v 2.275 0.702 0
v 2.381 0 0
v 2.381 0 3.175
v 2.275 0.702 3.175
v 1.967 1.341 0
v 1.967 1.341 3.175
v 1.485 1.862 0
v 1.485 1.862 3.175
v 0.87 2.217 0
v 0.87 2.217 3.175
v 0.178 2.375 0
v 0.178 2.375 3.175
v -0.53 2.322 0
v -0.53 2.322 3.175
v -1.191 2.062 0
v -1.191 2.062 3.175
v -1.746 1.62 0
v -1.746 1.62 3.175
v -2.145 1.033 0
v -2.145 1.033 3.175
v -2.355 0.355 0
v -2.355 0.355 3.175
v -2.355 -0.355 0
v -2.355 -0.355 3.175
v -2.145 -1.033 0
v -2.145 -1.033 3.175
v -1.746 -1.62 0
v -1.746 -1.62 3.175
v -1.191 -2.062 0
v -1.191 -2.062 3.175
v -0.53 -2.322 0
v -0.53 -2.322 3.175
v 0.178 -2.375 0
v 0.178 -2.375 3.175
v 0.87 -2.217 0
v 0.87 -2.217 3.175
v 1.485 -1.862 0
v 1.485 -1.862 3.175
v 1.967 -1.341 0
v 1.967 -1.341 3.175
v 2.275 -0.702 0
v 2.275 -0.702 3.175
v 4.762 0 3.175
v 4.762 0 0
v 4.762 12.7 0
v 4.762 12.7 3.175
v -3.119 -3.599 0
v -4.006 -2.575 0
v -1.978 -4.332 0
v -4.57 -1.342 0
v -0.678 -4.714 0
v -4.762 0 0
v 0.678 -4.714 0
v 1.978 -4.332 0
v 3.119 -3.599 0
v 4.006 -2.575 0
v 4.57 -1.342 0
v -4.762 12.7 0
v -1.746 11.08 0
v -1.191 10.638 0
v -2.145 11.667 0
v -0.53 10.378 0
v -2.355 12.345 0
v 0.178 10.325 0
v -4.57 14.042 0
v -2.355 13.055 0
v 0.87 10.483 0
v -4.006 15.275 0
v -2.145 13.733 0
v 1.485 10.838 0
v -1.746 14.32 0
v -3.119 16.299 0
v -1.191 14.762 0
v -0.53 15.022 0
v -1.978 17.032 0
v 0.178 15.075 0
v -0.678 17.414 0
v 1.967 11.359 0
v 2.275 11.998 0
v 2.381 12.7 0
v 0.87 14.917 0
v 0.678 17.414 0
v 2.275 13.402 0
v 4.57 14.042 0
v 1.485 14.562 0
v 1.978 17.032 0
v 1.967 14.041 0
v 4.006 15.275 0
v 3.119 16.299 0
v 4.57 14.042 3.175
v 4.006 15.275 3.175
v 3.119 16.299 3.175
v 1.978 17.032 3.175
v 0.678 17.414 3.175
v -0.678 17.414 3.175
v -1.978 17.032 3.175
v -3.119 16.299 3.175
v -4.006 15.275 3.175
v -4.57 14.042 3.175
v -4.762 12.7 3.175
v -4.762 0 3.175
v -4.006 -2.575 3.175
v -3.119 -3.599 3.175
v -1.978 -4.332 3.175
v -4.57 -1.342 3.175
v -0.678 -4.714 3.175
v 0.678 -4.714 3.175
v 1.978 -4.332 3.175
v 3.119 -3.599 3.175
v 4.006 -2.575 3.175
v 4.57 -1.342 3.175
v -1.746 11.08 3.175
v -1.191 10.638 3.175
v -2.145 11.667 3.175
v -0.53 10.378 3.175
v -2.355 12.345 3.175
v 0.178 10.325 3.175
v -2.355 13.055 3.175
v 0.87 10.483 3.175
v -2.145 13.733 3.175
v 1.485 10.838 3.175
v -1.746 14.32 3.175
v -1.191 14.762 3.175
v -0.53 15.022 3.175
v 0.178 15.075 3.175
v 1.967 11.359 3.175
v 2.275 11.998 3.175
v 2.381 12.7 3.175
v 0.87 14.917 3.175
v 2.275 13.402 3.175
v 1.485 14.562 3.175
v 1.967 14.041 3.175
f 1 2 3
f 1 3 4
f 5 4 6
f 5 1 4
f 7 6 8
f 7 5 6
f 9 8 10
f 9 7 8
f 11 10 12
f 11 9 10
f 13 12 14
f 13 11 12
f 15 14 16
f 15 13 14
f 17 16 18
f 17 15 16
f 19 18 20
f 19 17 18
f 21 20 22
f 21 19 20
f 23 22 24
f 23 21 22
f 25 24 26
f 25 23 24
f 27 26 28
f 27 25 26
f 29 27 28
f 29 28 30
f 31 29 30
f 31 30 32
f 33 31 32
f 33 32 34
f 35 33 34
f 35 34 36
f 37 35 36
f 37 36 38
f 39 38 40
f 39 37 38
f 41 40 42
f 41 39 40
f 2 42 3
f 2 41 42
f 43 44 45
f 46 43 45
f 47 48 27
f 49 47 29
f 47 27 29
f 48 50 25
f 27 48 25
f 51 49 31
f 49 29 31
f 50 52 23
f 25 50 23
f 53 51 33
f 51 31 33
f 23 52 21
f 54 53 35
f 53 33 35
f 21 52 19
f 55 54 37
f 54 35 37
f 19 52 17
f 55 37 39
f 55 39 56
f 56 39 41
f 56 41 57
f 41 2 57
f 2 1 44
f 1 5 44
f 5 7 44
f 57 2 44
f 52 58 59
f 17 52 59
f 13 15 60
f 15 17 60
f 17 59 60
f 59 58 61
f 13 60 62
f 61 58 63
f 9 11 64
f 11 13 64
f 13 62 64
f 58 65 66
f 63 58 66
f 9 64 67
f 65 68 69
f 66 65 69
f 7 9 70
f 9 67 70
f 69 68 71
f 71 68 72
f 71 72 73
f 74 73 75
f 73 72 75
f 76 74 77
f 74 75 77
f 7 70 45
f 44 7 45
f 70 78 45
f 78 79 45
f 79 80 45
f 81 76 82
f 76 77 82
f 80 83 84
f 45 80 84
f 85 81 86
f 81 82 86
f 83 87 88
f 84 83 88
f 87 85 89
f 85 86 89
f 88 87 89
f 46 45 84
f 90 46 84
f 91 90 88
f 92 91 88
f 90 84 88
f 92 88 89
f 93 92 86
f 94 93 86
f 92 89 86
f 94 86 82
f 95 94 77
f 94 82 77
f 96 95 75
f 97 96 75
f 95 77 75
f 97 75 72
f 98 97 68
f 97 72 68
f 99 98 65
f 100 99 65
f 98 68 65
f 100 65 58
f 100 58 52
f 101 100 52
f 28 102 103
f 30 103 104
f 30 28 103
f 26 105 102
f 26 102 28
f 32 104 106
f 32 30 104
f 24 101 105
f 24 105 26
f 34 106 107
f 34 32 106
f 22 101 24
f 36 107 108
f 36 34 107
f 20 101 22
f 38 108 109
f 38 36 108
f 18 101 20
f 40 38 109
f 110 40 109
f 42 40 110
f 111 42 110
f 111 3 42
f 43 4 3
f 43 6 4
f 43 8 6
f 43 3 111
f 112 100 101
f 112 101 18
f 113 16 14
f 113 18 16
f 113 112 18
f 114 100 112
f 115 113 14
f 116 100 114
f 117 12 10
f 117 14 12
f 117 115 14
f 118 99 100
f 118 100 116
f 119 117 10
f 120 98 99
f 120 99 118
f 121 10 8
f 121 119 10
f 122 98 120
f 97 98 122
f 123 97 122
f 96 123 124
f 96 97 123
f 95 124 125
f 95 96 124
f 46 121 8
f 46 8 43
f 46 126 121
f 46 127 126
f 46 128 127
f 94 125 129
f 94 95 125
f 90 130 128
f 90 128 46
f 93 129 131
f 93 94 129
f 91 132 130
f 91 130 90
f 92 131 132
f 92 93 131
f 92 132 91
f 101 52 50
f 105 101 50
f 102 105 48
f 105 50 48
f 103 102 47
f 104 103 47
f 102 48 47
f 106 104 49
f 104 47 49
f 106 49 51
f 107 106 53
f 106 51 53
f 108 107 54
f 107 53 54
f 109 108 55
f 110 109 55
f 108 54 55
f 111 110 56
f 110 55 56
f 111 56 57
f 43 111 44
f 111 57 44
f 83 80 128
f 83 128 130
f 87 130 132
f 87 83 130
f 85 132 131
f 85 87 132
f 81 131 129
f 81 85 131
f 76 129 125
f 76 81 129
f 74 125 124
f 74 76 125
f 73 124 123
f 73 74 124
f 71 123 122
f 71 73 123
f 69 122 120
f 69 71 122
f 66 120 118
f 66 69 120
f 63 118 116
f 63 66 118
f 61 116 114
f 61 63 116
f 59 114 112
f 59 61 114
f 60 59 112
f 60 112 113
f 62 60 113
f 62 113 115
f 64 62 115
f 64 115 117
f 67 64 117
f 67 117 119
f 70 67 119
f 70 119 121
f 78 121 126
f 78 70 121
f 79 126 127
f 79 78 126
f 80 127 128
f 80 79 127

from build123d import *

# Parameters (mm, degrees)
SKETCH1_R           = 4.7625
SKETCH1_R_2         = 2.38125
BOSS_EXTRUDE1_DEPTH = 3.175


with BuildPart() as part:
    # Sketch1 → Boss-Extrude1 (new body)
    # profile 1 of 3: a face of its own
    with BuildSketch(Plane.XY):
        with BuildLine():
            Line((-4.7625, 12.7), (-4.7625, 0))
            ThreePointArc((-4.7625, 0), (0, 4.7625), (4.7625, 0))
            Line((4.7625, 0), (4.7625, 12.7))
            ThreePointArc((4.7625, 12.7), (0, 7.9375), (-4.7625, 12.7))
        make_face()
    # profile 2 of 3: a face of its own
    with BuildSketch(Plane.XY):
        with Locations((0, 12.7)):
            Circle(SKETCH1_R)
        with Locations((0, 12.7)):
            Circle(SKETCH1_R_2, mode=Mode.SUBTRACT)
    # profile 3 of 3: a face of its own
    with BuildSketch(Plane.XY):
        Circle(SKETCH1_R)
        Circle(SKETCH1_R_2, mode=Mode.SUBTRACT)
    extrude(amount=BOSS_EXTRUDE1_DEPTH)


solid = part.part
